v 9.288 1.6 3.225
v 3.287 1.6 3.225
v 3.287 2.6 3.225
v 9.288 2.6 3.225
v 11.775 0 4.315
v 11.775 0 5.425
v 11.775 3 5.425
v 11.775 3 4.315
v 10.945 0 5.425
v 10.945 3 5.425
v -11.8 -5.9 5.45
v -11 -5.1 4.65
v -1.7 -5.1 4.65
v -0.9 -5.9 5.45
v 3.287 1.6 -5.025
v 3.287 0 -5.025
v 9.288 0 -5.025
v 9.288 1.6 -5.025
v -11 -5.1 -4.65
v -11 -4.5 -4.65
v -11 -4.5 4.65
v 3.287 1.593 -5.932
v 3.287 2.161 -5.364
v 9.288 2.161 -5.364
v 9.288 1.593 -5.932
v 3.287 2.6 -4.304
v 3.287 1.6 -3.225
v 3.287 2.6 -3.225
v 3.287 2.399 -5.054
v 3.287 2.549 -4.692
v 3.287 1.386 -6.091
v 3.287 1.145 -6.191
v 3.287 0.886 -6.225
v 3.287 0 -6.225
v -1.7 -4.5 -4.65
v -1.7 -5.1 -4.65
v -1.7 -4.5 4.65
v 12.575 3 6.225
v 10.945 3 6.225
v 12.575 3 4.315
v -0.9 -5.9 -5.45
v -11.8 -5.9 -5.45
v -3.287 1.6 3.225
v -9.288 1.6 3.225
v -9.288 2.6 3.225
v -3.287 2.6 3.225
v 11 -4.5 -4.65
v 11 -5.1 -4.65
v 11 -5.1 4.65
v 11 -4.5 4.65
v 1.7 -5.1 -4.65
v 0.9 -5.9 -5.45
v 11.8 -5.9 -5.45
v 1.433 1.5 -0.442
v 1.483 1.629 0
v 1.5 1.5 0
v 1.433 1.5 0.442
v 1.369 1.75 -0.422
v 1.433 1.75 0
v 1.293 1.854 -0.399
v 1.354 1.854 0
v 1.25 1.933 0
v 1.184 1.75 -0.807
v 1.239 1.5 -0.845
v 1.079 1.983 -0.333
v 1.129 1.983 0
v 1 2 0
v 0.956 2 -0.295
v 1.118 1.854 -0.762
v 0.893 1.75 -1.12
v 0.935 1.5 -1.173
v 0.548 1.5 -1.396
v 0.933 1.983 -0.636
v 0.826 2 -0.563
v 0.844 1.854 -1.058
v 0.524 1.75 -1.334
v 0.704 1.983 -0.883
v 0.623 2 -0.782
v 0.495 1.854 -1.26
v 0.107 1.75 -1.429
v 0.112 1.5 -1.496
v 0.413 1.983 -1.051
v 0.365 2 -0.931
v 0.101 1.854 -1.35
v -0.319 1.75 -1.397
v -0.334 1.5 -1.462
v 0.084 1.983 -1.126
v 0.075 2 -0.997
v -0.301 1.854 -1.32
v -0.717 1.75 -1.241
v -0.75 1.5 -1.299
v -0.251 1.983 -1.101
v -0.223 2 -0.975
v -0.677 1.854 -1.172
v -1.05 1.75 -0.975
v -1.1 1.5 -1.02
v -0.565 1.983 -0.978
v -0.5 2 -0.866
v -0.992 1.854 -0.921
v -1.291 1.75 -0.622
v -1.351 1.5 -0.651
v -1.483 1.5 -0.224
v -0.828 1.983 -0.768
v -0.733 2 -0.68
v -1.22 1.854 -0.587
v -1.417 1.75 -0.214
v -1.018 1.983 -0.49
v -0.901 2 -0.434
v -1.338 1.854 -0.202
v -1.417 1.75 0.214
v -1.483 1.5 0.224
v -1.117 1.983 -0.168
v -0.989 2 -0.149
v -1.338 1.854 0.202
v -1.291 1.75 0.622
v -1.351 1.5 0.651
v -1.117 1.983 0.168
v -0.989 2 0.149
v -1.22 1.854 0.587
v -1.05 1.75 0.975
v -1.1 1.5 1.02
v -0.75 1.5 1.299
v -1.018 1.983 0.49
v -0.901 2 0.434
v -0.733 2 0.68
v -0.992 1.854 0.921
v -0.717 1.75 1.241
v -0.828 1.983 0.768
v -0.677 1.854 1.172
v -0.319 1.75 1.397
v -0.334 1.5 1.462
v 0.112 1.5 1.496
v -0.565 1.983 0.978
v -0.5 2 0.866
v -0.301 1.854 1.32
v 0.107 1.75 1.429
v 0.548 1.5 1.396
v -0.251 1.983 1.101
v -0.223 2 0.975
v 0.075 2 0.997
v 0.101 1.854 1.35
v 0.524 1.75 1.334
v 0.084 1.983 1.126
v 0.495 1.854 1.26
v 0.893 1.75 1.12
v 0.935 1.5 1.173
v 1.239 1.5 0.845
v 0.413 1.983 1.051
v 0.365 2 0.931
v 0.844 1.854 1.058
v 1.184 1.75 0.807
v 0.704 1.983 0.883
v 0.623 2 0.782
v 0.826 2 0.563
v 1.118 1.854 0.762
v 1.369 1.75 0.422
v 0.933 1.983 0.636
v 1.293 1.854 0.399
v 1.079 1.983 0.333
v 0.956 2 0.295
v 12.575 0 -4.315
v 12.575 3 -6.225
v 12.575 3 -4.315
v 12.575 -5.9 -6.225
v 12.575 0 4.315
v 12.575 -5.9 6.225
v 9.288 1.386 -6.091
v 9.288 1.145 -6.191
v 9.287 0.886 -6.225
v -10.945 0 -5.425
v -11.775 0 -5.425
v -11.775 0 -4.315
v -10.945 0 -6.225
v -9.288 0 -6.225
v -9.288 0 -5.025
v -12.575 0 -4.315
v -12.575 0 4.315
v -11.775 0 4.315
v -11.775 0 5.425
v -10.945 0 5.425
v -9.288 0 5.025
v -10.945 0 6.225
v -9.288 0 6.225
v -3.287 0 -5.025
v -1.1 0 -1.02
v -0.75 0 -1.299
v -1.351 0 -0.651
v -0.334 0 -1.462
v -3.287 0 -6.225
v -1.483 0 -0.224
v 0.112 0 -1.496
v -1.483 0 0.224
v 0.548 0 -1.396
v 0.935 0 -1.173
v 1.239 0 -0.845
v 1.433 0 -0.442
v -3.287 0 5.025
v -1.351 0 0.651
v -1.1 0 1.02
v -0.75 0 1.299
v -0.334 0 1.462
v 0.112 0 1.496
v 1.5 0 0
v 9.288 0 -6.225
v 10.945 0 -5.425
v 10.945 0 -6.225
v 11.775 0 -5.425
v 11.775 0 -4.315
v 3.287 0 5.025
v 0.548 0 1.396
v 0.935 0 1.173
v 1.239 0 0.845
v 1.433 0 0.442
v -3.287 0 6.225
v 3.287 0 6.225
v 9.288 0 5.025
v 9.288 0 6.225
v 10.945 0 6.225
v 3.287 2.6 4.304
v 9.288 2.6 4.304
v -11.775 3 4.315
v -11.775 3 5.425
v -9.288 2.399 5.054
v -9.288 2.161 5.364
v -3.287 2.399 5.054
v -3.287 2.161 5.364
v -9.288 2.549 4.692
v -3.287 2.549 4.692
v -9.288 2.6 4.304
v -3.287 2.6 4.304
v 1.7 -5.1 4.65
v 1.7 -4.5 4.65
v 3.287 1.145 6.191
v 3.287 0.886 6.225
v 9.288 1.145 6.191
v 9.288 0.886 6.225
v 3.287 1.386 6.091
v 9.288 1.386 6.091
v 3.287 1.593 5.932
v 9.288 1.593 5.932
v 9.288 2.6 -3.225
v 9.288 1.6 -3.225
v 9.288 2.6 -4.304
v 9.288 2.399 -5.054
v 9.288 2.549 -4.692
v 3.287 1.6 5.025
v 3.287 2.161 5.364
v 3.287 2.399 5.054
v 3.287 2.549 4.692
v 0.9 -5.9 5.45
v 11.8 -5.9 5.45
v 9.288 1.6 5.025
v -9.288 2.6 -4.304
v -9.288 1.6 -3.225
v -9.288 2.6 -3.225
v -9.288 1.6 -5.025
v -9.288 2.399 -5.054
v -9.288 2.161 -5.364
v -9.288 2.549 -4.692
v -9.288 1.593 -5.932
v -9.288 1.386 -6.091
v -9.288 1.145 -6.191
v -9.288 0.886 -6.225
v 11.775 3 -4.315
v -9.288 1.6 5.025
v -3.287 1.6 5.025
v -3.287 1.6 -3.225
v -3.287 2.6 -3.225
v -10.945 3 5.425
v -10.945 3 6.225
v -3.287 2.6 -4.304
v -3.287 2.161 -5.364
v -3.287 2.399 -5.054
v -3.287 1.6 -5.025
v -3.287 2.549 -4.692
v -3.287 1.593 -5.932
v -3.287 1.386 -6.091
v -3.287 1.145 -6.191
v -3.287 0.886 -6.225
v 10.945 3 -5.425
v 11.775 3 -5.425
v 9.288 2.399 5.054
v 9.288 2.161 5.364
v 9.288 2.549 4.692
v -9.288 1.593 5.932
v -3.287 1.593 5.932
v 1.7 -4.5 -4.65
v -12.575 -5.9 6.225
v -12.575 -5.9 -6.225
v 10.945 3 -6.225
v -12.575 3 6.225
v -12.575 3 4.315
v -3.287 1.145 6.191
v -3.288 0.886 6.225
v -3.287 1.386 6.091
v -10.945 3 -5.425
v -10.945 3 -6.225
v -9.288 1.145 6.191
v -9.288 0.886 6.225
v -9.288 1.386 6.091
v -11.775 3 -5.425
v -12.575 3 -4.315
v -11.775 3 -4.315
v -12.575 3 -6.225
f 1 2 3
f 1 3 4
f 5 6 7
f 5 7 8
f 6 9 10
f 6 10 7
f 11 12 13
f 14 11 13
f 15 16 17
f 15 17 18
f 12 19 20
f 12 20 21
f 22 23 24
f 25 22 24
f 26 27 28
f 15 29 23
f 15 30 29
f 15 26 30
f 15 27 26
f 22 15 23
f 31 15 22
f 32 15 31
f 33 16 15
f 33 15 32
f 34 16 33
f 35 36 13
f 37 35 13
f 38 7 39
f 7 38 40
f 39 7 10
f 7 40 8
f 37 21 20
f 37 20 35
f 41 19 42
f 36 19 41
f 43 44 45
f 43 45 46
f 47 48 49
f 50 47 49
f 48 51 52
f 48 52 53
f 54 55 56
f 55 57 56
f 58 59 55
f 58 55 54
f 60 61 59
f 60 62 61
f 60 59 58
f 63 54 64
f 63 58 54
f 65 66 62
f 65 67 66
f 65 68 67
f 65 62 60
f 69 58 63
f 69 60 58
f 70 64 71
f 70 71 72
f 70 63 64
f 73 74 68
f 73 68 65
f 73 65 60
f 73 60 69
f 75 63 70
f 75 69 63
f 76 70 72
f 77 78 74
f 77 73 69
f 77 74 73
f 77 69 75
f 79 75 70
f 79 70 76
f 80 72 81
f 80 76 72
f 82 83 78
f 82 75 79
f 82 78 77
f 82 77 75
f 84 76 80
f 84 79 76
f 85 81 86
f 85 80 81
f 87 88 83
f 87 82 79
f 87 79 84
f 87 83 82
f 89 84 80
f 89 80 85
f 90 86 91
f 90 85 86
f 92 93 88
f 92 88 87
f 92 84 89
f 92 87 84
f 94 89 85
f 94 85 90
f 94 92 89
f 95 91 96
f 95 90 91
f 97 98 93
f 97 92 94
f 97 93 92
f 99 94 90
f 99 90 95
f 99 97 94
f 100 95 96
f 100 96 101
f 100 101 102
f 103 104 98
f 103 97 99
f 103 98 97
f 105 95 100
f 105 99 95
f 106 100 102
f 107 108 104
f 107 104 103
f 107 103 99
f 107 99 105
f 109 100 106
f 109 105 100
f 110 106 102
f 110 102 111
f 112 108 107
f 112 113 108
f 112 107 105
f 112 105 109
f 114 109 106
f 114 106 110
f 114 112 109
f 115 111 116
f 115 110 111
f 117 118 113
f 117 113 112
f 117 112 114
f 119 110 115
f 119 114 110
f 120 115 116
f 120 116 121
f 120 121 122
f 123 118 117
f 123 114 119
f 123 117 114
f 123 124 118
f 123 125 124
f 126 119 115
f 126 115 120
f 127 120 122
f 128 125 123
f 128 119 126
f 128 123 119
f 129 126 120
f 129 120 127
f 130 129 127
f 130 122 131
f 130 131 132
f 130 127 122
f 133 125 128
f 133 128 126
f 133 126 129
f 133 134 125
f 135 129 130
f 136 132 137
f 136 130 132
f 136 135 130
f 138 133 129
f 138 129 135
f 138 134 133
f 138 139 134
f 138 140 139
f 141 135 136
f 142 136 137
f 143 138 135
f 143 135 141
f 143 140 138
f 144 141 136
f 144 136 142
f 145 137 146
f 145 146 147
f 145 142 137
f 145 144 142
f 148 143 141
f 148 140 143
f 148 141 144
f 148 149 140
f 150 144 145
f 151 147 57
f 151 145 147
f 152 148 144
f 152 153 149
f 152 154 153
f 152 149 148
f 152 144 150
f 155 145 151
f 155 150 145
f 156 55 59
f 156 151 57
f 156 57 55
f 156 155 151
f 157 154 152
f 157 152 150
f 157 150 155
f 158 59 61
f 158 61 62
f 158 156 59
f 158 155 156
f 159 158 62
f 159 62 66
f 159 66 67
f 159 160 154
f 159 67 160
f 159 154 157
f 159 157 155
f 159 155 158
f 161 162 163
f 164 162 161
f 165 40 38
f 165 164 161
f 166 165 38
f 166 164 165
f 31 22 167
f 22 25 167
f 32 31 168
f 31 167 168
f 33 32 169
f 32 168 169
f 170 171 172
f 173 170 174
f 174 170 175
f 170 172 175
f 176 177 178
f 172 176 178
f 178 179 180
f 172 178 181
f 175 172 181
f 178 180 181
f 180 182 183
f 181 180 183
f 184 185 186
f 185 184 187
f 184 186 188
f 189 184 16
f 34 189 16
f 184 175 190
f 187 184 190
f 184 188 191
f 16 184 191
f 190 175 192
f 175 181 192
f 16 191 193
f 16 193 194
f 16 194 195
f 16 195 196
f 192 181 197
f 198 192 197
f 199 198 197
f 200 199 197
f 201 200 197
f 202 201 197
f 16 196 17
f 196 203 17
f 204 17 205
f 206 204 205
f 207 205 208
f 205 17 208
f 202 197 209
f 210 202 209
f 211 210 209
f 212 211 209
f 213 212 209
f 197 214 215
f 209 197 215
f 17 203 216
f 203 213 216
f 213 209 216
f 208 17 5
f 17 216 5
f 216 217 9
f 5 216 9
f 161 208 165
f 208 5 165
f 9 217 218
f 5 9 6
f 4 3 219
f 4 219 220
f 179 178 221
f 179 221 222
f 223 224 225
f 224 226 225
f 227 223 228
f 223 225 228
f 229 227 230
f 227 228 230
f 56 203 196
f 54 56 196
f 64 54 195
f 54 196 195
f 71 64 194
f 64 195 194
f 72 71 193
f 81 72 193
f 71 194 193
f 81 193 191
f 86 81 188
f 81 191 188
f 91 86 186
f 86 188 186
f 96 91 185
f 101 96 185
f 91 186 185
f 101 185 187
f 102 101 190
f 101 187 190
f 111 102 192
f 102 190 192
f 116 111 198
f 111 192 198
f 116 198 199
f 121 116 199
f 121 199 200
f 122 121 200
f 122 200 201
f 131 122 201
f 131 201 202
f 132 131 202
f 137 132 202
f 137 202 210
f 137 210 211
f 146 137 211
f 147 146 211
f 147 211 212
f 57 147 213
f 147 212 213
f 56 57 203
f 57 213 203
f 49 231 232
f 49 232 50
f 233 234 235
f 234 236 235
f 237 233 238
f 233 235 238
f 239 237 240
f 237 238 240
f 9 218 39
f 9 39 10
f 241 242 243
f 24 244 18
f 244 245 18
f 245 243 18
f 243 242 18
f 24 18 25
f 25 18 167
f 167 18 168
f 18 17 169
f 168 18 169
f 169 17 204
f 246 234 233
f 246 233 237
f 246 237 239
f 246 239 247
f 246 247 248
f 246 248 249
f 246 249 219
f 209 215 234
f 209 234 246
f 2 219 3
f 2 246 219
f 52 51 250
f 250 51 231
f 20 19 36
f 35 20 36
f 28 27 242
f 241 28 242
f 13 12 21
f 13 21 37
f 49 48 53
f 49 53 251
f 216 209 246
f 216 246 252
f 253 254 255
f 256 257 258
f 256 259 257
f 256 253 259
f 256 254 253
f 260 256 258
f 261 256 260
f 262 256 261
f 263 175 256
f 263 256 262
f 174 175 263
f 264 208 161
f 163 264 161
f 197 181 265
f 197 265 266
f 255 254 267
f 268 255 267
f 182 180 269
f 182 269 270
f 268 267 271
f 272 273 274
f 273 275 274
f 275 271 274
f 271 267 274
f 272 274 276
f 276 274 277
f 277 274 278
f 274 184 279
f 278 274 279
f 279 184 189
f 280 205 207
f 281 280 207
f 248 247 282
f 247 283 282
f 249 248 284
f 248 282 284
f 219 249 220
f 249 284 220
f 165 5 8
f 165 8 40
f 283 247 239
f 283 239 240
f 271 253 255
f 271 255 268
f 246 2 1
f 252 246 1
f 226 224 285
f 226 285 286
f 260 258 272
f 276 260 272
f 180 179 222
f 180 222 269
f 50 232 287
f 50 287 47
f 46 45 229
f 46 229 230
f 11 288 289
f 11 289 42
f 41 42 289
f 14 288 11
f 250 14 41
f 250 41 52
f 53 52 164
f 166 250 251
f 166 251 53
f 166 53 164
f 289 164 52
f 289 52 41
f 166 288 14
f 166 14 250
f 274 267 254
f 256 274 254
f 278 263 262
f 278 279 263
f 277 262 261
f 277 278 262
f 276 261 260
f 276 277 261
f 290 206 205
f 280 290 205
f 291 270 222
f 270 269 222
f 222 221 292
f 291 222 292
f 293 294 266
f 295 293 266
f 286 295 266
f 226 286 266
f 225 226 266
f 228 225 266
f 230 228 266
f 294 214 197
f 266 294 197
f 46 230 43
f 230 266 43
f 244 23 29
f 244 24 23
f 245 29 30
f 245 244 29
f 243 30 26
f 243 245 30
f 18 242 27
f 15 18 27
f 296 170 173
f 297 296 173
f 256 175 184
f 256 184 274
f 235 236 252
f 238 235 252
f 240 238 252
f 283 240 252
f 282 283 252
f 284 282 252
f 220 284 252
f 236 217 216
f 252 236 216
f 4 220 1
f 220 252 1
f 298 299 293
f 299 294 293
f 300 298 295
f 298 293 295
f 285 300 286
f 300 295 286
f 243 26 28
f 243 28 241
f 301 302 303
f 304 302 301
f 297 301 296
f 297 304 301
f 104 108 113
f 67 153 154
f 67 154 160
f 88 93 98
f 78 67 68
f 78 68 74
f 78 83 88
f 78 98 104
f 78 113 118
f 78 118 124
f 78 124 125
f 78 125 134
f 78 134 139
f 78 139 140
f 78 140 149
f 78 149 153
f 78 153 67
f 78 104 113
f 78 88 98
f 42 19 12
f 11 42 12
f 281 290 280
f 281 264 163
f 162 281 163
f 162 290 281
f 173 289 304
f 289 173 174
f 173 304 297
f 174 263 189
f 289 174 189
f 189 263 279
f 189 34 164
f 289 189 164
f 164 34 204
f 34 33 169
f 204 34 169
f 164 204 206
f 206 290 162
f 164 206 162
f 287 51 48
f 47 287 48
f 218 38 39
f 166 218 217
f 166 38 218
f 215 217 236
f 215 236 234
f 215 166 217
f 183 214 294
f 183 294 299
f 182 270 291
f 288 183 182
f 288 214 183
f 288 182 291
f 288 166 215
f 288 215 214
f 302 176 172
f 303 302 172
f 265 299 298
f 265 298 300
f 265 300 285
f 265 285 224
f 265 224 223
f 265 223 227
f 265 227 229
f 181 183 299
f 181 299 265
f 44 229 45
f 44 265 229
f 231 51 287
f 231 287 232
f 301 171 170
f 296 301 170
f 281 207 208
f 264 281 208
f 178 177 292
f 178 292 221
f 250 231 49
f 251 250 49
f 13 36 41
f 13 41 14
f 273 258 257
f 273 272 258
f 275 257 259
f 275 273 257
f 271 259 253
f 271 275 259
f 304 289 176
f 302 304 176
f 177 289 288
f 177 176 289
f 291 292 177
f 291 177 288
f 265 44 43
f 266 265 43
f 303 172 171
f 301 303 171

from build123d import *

# Parameters (mm, degrees)
SKETCH013_W     = 25.15
SKETCH013_H     = 12.45
PAD001_DEPTH    = 5.9
SKETCH018_W     = 9.3
SKETCH018_H     = 9.3
POCKET008_DEPTH = 1.4
CHAMFER_SIZE    = 0.8
PAD003_DEPTH    = 3
SKETCH007_W     = 6
SKETCH007_H     = 3
PAD004_DEPTH    = 2.6
SKETCH008_R     = 1.5
PAD005_DEPTH    = 2
FILLET004_R     = 0.5
CHAMFER003_SIZE = 1.3
FILLET003_R     = 1.5
FILLET002_R     = 1
SKETCH009_W     = 6
SKETCH009_H     = 1.6
POCKET006_DEPTH = 1.8
SKETCH010_W     = 6
SKETCH010_H     = 1.6
POCKET007_DEPTH = 1.8
SKETCH014_W     = 1.6
SKETCH014_H     = 6
POCKET005_DEPTH = 1.8


with BuildPart() as part:
    # Sketch013 → Pad001 (new body)
    with BuildSketch(Plane.XZ):
        Rectangle(SKETCH013_W, SKETCH013_H)
    extrude(amount=PAD001_DEPTH)

    # Sketch018 (on Face6 of Pad001) → Pocket008 (cut)
    with BuildSketch(Plane.XZ.offset(5.9)):
        with Locations((-6.35, 0)):
            Rectangle(SKETCH018_W, SKETCH018_H)
        with Locations((6.35, 0)):
            Rectangle(SKETCH018_W, SKETCH018_H)
    extrude(amount=-POCKET008_DEPTH, mode=Mode.SUBTRACT)

    # Chamfer
    chamfer_edges = [part.edges().sort_by_distance(p)[0] for p in [
        (-6.35, -5.9, 4.65),
        (-11, -5.9, 0),
        (-6.35, -5.9, -4.65),
        (-1.7, -5.9, 0),
        (1.7, -5.9, 0),
        (6.35, -5.9, 4.65),
        (11, -5.9, 0),
        (6.35, -5.9, -4.65),
    ]]
    chamfer(chamfer_edges, length=CHAMFER_SIZE)

    # Sketch015 (on Face18 of Chamfer) → Pad003 (join)
    with BuildSketch(Plane(origin=(0, 0, 0), x_dir=(1, 0, 0), z_dir=(0, 1, 0))):
        Polygon((12.575, -4.315), (12.575, -6.225), (10.945, -6.225), (10.945, -5.425), (11.775, -5.425), (11.775, -4.315), align=None)
        Polygon((-10.945, -6.225), (-12.575, -6.225), (-12.575, -4.315), (-11.775, -4.315), (-11.775, -5.425), (-10.945, -5.425), align=None)
        Polygon((12.575, 4.315), (12.575, 6.225), (10.945, 6.225), (10.945, 5.425), (11.775, 5.425), (11.775, 4.315), align=None)
        Polygon((-11.775, 4.315), (-11.775, 5.425), (-10.945, 5.425), (-10.945, 6.225), (-12.575, 6.225), (-12.575, 4.315), align=None)
    extrude(amount=PAD003_DEPTH)

    # Sketch007 (on Face19 of Pad003) → Pad004 (join)
    with BuildSketch(Plane(origin=(0, 0, 0), x_dir=(1, 0, 0), z_dir=(0, 1, 0))):
        with Locations((-6.2875, 4.725)):
            Rectangle(SKETCH007_W, SKETCH007_H)
        with Locations((6.2875, 4.725)):
            Rectangle(SKETCH007_W, SKETCH007_H)
        with Locations((-6.2875, -4.725)):
            Rectangle(SKETCH007_W, SKETCH007_H)
        with Locations((6.2875, -4.725)):
            Rectangle(SKETCH007_W, SKETCH007_H)
    extrude(amount=PAD004_DEPTH)

    # Sketch008 (on Face19 of Pad004) → Pad005 (join)
    with BuildSketch(Plane(origin=(0, 0, 0), x_dir=(1, 0, 0), z_dir=(0, 1, 0))):
        Circle(SKETCH008_R)
    extrude(amount=PAD005_DEPTH)

    # Fillet004
    fillet004_edges = [part.edges().sort_by_distance(p)[0] for p in [
        (-1.5, 2, 0),
    ]]
    fillet(fillet004_edges, radius=FILLET004_R)

    # Chamfer003
    chamfer003_edges = [part.edges().sort_by_distance(p)[0] for p in [
        (6.2875, 2.6, -6.225),
        (-6.2875, 2.6, -6.225),
        (6.2875, 2.6, 6.225),
        (-6.2875, 2.6, 6.225),
    ]]
    chamfer(chamfer003_edges, length=CHAMFER003_SIZE)

    # Fillet003
    fillet003_edges = [part.edges().sort_by_distance(p)[0] for p in [
        (-6.2875, 2.6, 4.925),
        (6.2875, 2.6, 4.925),
        (-6.2875, 2.6, -4.925),
        (6.2875, 2.6, -4.925),
    ]]
    fillet(fillet003_edges, radius=FILLET003_R)

    # Fillet002
    fillet002_edges = [part.edges().sort_by_distance(p)[0] for p in [
        (6.2875, 1.3, -6.225),
        (-6.2875, 1.3, -6.225),
        (6.2875, 1.3, 6.225),
        (-6.2875, 1.3, 6.225),
    ]]
    fillet(fillet002_edges, radius=FILLET002_R)

    # Sketch009 (on Face22 of Fillet002) → Pocket006 (cut)
    with BuildSketch(Plane(origin=(0, 0, 3.225), x_dir=(1, 0, 0), z_dir=(0, 0, -1))):
        with Locations((-6.2875, -0.8)):
            Rectangle(SKETCH009_W, SKETCH009_H)
    extrude(amount=-POCKET006_DEPTH, mode=Mode.SUBTRACT)

    # Sketch010 (on Face25 of Pocket006) → Pocket007 (cut)
    with BuildSketch(Plane(origin=(0, 0, 3.225), x_dir=(1, 0, 0), z_dir=(0, 0, -1))):
        with Locations((6.2875, -0.8)):
            Rectangle(SKETCH010_W, SKETCH010_H)
    extrude(amount=-POCKET007_DEPTH, mode=Mode.SUBTRACT)

    # Sketch014 (on DatumPlane) → Pocket005 (cut)
    with BuildSketch(Plane(origin=(0, 1.3, -3.225), x_dir=(0, 1, 0), z_dir=(0, 0, 1))):
        with Locations((-0.5, 6.2875)):
            Rectangle(SKETCH014_W, SKETCH014_H)
        with Locations((-0.5, -6.2875)):
            Rectangle(SKETCH014_W, SKETCH014_H)
    extrude(amount=-POCKET005_DEPTH, mode=Mode.SUBTRACT)


solid = part.part
